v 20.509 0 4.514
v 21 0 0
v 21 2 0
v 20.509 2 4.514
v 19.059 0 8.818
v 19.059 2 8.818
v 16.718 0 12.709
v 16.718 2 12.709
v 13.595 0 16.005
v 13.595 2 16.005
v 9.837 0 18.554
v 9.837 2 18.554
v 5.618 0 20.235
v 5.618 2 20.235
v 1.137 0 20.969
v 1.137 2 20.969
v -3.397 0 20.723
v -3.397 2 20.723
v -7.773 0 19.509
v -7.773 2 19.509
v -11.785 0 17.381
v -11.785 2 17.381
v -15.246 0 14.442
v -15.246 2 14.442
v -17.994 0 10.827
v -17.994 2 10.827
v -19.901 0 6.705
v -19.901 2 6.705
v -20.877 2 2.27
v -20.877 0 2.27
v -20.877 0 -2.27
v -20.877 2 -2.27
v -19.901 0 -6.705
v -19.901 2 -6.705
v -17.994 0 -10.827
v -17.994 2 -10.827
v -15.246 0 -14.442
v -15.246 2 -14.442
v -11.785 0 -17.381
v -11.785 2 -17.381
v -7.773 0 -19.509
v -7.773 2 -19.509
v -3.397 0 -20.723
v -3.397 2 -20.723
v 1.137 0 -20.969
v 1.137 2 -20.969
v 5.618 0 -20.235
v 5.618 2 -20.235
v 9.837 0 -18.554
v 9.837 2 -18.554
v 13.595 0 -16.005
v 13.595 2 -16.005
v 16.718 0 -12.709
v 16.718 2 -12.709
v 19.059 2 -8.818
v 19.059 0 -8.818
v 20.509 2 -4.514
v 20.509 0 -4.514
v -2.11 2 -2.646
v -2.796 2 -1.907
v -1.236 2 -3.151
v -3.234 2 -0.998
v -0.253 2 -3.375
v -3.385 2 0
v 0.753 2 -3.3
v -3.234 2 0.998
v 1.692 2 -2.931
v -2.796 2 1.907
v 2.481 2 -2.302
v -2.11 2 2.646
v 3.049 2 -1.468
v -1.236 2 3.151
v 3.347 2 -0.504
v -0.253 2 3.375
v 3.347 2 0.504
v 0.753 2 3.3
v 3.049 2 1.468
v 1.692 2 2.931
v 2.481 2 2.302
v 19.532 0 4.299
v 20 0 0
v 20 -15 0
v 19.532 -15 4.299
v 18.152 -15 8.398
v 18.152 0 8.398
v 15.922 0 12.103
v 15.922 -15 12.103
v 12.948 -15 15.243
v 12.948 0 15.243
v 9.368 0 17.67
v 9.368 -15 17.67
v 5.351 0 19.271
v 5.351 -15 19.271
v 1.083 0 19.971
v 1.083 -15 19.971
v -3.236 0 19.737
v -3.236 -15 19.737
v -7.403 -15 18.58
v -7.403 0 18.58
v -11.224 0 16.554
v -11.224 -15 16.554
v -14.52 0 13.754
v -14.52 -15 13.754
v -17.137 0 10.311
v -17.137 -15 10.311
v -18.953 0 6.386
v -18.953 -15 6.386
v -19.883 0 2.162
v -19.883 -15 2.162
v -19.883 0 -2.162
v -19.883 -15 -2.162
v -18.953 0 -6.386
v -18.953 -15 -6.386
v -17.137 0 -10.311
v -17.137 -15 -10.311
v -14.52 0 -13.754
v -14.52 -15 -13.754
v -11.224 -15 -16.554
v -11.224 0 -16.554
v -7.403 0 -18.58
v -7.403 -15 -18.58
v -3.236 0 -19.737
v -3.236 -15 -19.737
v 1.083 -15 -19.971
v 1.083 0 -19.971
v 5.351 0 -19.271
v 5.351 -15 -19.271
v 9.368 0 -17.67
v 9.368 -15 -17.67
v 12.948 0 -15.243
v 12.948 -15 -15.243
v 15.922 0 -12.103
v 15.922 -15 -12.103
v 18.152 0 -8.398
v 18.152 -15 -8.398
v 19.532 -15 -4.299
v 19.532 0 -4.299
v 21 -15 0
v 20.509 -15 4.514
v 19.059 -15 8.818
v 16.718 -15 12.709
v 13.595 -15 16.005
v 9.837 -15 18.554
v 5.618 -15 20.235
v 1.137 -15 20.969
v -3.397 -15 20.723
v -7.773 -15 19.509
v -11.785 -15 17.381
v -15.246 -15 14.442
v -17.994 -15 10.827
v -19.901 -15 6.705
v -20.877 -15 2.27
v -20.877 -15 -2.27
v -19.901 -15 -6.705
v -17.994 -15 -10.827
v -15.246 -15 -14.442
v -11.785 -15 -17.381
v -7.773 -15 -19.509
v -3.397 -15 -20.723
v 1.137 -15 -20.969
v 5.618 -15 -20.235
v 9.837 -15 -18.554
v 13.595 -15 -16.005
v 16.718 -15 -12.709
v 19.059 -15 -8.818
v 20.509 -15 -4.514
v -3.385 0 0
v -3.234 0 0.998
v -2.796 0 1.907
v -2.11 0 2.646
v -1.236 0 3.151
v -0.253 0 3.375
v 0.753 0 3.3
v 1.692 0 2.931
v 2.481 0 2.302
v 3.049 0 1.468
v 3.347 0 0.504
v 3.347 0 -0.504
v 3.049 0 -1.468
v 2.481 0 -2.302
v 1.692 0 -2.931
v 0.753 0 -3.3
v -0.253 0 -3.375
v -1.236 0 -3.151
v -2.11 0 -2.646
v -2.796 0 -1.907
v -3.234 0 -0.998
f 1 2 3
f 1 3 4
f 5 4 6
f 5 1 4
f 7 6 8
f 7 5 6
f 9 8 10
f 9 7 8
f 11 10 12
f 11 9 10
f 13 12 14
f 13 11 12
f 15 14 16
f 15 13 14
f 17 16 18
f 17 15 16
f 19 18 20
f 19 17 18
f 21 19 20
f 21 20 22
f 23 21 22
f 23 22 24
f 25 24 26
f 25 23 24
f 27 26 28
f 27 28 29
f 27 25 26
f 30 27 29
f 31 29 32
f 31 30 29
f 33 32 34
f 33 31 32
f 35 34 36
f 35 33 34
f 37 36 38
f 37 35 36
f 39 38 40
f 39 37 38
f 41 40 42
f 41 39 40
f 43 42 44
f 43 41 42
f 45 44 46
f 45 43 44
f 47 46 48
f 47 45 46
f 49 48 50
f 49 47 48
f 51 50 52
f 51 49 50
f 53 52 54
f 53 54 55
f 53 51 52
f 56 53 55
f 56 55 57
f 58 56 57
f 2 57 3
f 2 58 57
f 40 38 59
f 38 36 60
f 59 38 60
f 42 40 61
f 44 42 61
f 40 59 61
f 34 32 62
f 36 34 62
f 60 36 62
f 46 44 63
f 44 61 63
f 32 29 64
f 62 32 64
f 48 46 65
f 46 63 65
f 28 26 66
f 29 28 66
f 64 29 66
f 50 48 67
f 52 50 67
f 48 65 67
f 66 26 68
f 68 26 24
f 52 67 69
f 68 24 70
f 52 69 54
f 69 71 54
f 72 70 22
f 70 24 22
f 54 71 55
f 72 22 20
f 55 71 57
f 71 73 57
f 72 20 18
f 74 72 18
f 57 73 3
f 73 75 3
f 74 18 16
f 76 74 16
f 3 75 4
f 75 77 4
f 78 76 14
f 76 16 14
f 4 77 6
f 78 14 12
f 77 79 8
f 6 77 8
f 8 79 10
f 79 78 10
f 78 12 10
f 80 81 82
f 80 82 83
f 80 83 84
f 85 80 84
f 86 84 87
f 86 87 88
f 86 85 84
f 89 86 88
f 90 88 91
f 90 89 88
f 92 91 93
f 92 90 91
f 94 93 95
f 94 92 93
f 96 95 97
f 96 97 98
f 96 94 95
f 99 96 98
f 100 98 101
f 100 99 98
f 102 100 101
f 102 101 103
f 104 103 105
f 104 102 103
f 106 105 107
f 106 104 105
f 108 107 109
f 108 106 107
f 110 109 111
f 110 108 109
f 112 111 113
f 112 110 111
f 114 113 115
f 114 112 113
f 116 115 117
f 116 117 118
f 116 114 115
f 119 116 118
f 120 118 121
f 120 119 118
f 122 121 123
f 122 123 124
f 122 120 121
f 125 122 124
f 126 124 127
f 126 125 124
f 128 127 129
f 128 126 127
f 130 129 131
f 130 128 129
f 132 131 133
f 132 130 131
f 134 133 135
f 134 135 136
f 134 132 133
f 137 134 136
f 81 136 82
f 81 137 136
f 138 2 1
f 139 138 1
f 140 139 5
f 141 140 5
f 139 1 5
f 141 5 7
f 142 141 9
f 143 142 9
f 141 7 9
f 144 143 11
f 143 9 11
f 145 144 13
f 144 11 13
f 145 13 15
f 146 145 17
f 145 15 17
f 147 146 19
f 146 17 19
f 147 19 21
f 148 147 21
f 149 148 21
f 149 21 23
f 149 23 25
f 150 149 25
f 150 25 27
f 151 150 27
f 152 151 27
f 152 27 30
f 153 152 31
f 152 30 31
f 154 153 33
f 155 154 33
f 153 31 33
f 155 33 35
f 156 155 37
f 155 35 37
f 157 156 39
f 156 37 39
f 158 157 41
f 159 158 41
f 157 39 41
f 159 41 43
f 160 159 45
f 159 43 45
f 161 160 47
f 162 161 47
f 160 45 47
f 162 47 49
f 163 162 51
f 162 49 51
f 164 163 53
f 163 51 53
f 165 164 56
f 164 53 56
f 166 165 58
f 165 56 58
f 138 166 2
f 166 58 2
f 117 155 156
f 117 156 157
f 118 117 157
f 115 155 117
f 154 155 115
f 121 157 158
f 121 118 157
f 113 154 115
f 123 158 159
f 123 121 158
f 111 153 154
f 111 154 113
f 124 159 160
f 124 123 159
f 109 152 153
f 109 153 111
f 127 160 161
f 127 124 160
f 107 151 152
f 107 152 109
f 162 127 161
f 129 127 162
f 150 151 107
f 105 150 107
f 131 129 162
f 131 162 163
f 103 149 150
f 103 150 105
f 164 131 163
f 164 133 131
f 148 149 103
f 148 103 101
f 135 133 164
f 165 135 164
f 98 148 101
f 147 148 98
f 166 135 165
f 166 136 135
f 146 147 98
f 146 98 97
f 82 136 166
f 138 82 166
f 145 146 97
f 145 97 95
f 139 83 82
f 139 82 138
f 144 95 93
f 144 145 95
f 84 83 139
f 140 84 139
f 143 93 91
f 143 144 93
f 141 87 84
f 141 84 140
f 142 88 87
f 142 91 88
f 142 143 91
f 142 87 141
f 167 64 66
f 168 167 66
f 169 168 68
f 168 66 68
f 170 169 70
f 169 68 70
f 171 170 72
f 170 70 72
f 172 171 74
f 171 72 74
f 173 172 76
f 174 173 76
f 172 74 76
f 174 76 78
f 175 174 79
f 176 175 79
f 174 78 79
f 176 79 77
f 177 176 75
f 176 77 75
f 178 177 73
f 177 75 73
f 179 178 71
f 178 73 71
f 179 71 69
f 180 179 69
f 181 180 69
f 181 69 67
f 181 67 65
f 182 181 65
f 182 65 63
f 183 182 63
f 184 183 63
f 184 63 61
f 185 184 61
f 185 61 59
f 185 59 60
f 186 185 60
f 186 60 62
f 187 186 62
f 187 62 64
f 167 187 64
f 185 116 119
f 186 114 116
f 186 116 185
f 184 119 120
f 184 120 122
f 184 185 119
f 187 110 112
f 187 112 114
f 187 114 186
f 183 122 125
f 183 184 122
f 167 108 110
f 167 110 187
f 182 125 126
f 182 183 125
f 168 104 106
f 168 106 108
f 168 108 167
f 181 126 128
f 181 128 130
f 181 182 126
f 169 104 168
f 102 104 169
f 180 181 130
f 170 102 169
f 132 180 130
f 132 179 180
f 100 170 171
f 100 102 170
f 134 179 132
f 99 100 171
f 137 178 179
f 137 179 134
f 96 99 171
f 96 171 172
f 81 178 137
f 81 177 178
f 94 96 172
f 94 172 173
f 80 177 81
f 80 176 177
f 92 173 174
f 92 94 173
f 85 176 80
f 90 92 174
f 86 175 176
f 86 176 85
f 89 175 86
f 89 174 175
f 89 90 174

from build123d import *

# Parameters (mm, degrees)
F0_R     = 21
F0_R_2   = 20
F1_DEPTH = 2
F2_R     = 21
F2_R_2   = 20
F3_DEPTH = 15
F4_R     = 3.3845023637
F5_DEPTH = 25


# Not quite as in the source:
# - a feature names something its author has since deleted; it is built from what else it names


with BuildPart() as f1:
    # F0 (on Front) → F1 (new body)
    with BuildSketch(Plane.XZ):
        Circle(F0_R)
        Circle(F0_R_2, mode=Mode.SUBTRACT)
        Circle(F0_R_2)
    extrude(amount=-F1_DEPTH)

    # F2 (on face) → F3 (join)
    with BuildSketch(Plane.XZ):
        Circle(F2_R)
        Circle(F2_R_2, mode=Mode.SUBTRACT)
    extrude(amount=F3_DEPTH)

    # F4 (on face) → F5 (cut)
    with BuildSketch(Plane(origin=(0, 2, 0), x_dir=(-1, 0, 0), z_dir=(0, 1, 0))):
        Circle(F4_R)
    extrude(amount=-F5_DEPTH, mode=Mode.SUBTRACT)


solid = f1.part
